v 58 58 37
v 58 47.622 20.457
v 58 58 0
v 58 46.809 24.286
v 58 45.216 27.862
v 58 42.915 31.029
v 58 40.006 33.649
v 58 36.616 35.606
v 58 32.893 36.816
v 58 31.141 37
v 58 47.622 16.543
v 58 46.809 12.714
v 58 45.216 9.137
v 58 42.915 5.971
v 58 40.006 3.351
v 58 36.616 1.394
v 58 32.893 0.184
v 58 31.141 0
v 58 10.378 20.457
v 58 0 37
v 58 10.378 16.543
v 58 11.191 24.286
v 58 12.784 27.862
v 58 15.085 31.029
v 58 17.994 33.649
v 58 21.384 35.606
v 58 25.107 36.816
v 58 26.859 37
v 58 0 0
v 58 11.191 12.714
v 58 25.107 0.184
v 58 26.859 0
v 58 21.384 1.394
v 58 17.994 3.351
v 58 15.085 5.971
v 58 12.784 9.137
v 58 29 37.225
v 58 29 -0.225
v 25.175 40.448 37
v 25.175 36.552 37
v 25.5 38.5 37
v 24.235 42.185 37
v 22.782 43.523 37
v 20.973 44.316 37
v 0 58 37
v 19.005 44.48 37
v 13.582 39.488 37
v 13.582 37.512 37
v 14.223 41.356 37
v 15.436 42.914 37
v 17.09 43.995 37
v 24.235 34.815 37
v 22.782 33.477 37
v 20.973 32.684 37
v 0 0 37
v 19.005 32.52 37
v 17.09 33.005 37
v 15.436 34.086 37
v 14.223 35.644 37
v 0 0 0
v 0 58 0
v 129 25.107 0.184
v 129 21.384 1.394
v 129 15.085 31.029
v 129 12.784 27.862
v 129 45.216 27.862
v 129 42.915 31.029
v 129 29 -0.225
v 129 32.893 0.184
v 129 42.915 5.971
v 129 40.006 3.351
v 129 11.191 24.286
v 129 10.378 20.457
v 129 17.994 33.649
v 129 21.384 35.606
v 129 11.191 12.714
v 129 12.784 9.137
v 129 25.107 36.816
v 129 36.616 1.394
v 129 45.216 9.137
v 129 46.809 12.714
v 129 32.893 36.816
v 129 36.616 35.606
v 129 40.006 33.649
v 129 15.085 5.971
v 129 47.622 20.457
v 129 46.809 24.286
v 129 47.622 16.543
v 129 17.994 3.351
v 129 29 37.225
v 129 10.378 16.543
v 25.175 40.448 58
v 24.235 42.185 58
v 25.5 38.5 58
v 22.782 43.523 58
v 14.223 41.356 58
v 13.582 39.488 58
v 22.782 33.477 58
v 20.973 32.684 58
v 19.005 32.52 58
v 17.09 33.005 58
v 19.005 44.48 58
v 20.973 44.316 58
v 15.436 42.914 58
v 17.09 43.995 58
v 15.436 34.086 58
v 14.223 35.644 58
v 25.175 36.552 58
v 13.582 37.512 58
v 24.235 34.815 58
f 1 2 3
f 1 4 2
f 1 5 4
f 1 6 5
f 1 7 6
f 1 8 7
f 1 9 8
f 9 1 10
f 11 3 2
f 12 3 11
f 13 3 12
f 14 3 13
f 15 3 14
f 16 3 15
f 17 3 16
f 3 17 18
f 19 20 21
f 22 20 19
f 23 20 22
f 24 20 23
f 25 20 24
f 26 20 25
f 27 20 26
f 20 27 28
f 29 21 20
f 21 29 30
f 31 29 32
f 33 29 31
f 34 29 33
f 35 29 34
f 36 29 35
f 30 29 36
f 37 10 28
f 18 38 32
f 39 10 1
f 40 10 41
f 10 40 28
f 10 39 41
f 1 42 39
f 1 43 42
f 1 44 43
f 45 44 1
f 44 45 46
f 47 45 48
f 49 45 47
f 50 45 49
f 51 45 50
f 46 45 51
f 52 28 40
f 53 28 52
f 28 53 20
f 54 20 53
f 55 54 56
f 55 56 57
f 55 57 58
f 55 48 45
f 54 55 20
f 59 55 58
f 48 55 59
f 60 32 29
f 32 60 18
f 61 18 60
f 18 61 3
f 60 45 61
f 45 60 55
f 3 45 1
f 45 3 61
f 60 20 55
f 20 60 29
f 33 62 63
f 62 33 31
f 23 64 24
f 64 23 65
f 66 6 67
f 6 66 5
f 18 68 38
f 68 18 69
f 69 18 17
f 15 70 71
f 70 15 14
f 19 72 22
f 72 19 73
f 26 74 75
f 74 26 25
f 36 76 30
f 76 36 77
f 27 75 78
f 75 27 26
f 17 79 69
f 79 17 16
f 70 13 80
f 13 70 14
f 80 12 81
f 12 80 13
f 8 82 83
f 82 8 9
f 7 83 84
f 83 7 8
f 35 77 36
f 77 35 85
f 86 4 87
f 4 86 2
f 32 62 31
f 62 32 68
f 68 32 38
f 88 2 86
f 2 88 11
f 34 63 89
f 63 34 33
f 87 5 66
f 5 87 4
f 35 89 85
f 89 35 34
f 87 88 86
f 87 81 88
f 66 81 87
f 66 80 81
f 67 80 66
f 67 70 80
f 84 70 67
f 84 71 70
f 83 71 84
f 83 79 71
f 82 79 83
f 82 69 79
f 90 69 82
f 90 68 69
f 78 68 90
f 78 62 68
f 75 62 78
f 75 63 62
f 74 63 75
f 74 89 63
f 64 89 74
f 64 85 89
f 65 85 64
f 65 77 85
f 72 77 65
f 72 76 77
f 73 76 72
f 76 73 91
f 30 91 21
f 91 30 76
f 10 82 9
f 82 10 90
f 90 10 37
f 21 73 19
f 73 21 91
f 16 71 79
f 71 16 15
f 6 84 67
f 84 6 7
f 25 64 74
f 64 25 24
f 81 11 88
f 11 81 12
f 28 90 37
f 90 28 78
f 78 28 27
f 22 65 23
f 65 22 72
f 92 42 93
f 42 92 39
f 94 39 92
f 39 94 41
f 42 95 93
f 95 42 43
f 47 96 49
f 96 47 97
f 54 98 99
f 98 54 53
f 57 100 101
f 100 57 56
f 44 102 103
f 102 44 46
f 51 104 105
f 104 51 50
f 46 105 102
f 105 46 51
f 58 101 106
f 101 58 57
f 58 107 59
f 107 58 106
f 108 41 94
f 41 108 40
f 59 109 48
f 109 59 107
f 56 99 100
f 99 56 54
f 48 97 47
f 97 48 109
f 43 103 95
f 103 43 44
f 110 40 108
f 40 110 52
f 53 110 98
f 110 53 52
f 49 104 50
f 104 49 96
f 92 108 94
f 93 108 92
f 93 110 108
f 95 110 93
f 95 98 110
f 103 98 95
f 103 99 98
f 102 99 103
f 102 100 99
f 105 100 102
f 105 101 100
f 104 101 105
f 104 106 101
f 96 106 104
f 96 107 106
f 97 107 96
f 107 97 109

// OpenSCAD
// file: tolerance.scad
// Author: Mihai Oltean, https://mihaioltean.github.io, mihai.oltean@gmail.com
// More details: jenny5.org
// Source: github.com/jenny5-robot
// MIT License
//--------------------------------------------------------------

tolerance = 0.1;
display_tolerance = 1;

overlap_tolerance = 0.01;

tolerance_z = [0, 0, tolerance];
tolerance_x = [tolerance, 0, 0];
tolerance_y = [0, tolerance, 0];

display_tolerance_z = [0, 0, display_tolerance];
display_tolerance_x = [display_tolerance, 0, 0];
display_tolerance_y = [0, display_tolerance, 0];

display_tolerance_xz = [display_tolerance, 0, display_tolerance];
display_tolerance_xy = [display_tolerance, display_tolerance, 0];
display_tolerance_yz = [0, display_tolerance, display_tolerance];

display_tolerance_xyz = [display_tolerance, display_tolerance, display_tolerance];
// file: params_worm_gear_motor.scad
worm_600JSX_gear_box_size = [82.5, 58, 46];
worm_600JSX_motor_radius = 22;
worm_600JSX_motor_length = 66.53;
worm_600JSX_shaft_length = 20;
worm_600JSX_shaft_radius = 5;
worm_600JSX_shaft_position_x = 23.5;
worm_600JSX_shaft_postion_y = 29;


worm_GR_WM2_gear_box_size = [58, 58, 37];
worm_GR_WM2_motor_radius = 18.725;
worm_GR_WM2_motor_length = 71;
worm_GR_WM2_shaft_length = 21;
worm_GR_WM2_shaft_radius = 6;
worm_GR_WM2_shaft_position_x = 19.5;
worm_GR_WM2_shaft_position_y = 38.5;
// main file
include <params_worm_gear_motor.scad>
include <tolerance.scad>

//---------------------------------------------------------------
module worm_gear_motor(gear_box_size,
    motor_radius,
    motor_length,
    shaft_length,
    shaft_radius,
    shaft_position_x,
    shaft_position_y)
{
    color("grey"){
        // gear reduction
        cube(gear_box_size);
        // motor
        translate ([gear_box_size[0], gear_box_size[1] / 2, gear_box_size[2] / 2]) rotate ([0, 90, 0]) cylinder(h = motor_length, r = motor_radius);
        // shaft
        translate ([shaft_position_x, shaft_position_y, gear_box_size[2]])cylinder(h = shaft_length, r = shaft_radius);
    }
}

//---------------------------------------------------------------
module worm_gear_motor_600JSX()
{
    worm_gear_motor(
    worm_600JSX_gear_box_size,
worm_600JSX_motor_radius,
worm_600JSX_motor_length,
worm_600JSX_shaft_length,
worm_600JSX_shaft_radius,
worm_600JSX_shaft_position_x,
worm_600JSX_shaft_postion_y
);
}
//---------------------------------------------------------------
module worm_gear_motor_GR_WM2()
{
    worm_gear_motor(
    worm_GR_WM2_gear_box_size,
worm_GR_WM2_motor_radius,
worm_GR_WM2_motor_length,
worm_GR_WM2_shaft_length,
worm_GR_WM2_shaft_radius,
worm_GR_WM2_shaft_position_x,
worm_GR_WM2_shaft_position_y
);
}
//---------------------------------------------------------------
//worm_gear_motor_600JSX();

worm_gear_motor_GR_WM2();
